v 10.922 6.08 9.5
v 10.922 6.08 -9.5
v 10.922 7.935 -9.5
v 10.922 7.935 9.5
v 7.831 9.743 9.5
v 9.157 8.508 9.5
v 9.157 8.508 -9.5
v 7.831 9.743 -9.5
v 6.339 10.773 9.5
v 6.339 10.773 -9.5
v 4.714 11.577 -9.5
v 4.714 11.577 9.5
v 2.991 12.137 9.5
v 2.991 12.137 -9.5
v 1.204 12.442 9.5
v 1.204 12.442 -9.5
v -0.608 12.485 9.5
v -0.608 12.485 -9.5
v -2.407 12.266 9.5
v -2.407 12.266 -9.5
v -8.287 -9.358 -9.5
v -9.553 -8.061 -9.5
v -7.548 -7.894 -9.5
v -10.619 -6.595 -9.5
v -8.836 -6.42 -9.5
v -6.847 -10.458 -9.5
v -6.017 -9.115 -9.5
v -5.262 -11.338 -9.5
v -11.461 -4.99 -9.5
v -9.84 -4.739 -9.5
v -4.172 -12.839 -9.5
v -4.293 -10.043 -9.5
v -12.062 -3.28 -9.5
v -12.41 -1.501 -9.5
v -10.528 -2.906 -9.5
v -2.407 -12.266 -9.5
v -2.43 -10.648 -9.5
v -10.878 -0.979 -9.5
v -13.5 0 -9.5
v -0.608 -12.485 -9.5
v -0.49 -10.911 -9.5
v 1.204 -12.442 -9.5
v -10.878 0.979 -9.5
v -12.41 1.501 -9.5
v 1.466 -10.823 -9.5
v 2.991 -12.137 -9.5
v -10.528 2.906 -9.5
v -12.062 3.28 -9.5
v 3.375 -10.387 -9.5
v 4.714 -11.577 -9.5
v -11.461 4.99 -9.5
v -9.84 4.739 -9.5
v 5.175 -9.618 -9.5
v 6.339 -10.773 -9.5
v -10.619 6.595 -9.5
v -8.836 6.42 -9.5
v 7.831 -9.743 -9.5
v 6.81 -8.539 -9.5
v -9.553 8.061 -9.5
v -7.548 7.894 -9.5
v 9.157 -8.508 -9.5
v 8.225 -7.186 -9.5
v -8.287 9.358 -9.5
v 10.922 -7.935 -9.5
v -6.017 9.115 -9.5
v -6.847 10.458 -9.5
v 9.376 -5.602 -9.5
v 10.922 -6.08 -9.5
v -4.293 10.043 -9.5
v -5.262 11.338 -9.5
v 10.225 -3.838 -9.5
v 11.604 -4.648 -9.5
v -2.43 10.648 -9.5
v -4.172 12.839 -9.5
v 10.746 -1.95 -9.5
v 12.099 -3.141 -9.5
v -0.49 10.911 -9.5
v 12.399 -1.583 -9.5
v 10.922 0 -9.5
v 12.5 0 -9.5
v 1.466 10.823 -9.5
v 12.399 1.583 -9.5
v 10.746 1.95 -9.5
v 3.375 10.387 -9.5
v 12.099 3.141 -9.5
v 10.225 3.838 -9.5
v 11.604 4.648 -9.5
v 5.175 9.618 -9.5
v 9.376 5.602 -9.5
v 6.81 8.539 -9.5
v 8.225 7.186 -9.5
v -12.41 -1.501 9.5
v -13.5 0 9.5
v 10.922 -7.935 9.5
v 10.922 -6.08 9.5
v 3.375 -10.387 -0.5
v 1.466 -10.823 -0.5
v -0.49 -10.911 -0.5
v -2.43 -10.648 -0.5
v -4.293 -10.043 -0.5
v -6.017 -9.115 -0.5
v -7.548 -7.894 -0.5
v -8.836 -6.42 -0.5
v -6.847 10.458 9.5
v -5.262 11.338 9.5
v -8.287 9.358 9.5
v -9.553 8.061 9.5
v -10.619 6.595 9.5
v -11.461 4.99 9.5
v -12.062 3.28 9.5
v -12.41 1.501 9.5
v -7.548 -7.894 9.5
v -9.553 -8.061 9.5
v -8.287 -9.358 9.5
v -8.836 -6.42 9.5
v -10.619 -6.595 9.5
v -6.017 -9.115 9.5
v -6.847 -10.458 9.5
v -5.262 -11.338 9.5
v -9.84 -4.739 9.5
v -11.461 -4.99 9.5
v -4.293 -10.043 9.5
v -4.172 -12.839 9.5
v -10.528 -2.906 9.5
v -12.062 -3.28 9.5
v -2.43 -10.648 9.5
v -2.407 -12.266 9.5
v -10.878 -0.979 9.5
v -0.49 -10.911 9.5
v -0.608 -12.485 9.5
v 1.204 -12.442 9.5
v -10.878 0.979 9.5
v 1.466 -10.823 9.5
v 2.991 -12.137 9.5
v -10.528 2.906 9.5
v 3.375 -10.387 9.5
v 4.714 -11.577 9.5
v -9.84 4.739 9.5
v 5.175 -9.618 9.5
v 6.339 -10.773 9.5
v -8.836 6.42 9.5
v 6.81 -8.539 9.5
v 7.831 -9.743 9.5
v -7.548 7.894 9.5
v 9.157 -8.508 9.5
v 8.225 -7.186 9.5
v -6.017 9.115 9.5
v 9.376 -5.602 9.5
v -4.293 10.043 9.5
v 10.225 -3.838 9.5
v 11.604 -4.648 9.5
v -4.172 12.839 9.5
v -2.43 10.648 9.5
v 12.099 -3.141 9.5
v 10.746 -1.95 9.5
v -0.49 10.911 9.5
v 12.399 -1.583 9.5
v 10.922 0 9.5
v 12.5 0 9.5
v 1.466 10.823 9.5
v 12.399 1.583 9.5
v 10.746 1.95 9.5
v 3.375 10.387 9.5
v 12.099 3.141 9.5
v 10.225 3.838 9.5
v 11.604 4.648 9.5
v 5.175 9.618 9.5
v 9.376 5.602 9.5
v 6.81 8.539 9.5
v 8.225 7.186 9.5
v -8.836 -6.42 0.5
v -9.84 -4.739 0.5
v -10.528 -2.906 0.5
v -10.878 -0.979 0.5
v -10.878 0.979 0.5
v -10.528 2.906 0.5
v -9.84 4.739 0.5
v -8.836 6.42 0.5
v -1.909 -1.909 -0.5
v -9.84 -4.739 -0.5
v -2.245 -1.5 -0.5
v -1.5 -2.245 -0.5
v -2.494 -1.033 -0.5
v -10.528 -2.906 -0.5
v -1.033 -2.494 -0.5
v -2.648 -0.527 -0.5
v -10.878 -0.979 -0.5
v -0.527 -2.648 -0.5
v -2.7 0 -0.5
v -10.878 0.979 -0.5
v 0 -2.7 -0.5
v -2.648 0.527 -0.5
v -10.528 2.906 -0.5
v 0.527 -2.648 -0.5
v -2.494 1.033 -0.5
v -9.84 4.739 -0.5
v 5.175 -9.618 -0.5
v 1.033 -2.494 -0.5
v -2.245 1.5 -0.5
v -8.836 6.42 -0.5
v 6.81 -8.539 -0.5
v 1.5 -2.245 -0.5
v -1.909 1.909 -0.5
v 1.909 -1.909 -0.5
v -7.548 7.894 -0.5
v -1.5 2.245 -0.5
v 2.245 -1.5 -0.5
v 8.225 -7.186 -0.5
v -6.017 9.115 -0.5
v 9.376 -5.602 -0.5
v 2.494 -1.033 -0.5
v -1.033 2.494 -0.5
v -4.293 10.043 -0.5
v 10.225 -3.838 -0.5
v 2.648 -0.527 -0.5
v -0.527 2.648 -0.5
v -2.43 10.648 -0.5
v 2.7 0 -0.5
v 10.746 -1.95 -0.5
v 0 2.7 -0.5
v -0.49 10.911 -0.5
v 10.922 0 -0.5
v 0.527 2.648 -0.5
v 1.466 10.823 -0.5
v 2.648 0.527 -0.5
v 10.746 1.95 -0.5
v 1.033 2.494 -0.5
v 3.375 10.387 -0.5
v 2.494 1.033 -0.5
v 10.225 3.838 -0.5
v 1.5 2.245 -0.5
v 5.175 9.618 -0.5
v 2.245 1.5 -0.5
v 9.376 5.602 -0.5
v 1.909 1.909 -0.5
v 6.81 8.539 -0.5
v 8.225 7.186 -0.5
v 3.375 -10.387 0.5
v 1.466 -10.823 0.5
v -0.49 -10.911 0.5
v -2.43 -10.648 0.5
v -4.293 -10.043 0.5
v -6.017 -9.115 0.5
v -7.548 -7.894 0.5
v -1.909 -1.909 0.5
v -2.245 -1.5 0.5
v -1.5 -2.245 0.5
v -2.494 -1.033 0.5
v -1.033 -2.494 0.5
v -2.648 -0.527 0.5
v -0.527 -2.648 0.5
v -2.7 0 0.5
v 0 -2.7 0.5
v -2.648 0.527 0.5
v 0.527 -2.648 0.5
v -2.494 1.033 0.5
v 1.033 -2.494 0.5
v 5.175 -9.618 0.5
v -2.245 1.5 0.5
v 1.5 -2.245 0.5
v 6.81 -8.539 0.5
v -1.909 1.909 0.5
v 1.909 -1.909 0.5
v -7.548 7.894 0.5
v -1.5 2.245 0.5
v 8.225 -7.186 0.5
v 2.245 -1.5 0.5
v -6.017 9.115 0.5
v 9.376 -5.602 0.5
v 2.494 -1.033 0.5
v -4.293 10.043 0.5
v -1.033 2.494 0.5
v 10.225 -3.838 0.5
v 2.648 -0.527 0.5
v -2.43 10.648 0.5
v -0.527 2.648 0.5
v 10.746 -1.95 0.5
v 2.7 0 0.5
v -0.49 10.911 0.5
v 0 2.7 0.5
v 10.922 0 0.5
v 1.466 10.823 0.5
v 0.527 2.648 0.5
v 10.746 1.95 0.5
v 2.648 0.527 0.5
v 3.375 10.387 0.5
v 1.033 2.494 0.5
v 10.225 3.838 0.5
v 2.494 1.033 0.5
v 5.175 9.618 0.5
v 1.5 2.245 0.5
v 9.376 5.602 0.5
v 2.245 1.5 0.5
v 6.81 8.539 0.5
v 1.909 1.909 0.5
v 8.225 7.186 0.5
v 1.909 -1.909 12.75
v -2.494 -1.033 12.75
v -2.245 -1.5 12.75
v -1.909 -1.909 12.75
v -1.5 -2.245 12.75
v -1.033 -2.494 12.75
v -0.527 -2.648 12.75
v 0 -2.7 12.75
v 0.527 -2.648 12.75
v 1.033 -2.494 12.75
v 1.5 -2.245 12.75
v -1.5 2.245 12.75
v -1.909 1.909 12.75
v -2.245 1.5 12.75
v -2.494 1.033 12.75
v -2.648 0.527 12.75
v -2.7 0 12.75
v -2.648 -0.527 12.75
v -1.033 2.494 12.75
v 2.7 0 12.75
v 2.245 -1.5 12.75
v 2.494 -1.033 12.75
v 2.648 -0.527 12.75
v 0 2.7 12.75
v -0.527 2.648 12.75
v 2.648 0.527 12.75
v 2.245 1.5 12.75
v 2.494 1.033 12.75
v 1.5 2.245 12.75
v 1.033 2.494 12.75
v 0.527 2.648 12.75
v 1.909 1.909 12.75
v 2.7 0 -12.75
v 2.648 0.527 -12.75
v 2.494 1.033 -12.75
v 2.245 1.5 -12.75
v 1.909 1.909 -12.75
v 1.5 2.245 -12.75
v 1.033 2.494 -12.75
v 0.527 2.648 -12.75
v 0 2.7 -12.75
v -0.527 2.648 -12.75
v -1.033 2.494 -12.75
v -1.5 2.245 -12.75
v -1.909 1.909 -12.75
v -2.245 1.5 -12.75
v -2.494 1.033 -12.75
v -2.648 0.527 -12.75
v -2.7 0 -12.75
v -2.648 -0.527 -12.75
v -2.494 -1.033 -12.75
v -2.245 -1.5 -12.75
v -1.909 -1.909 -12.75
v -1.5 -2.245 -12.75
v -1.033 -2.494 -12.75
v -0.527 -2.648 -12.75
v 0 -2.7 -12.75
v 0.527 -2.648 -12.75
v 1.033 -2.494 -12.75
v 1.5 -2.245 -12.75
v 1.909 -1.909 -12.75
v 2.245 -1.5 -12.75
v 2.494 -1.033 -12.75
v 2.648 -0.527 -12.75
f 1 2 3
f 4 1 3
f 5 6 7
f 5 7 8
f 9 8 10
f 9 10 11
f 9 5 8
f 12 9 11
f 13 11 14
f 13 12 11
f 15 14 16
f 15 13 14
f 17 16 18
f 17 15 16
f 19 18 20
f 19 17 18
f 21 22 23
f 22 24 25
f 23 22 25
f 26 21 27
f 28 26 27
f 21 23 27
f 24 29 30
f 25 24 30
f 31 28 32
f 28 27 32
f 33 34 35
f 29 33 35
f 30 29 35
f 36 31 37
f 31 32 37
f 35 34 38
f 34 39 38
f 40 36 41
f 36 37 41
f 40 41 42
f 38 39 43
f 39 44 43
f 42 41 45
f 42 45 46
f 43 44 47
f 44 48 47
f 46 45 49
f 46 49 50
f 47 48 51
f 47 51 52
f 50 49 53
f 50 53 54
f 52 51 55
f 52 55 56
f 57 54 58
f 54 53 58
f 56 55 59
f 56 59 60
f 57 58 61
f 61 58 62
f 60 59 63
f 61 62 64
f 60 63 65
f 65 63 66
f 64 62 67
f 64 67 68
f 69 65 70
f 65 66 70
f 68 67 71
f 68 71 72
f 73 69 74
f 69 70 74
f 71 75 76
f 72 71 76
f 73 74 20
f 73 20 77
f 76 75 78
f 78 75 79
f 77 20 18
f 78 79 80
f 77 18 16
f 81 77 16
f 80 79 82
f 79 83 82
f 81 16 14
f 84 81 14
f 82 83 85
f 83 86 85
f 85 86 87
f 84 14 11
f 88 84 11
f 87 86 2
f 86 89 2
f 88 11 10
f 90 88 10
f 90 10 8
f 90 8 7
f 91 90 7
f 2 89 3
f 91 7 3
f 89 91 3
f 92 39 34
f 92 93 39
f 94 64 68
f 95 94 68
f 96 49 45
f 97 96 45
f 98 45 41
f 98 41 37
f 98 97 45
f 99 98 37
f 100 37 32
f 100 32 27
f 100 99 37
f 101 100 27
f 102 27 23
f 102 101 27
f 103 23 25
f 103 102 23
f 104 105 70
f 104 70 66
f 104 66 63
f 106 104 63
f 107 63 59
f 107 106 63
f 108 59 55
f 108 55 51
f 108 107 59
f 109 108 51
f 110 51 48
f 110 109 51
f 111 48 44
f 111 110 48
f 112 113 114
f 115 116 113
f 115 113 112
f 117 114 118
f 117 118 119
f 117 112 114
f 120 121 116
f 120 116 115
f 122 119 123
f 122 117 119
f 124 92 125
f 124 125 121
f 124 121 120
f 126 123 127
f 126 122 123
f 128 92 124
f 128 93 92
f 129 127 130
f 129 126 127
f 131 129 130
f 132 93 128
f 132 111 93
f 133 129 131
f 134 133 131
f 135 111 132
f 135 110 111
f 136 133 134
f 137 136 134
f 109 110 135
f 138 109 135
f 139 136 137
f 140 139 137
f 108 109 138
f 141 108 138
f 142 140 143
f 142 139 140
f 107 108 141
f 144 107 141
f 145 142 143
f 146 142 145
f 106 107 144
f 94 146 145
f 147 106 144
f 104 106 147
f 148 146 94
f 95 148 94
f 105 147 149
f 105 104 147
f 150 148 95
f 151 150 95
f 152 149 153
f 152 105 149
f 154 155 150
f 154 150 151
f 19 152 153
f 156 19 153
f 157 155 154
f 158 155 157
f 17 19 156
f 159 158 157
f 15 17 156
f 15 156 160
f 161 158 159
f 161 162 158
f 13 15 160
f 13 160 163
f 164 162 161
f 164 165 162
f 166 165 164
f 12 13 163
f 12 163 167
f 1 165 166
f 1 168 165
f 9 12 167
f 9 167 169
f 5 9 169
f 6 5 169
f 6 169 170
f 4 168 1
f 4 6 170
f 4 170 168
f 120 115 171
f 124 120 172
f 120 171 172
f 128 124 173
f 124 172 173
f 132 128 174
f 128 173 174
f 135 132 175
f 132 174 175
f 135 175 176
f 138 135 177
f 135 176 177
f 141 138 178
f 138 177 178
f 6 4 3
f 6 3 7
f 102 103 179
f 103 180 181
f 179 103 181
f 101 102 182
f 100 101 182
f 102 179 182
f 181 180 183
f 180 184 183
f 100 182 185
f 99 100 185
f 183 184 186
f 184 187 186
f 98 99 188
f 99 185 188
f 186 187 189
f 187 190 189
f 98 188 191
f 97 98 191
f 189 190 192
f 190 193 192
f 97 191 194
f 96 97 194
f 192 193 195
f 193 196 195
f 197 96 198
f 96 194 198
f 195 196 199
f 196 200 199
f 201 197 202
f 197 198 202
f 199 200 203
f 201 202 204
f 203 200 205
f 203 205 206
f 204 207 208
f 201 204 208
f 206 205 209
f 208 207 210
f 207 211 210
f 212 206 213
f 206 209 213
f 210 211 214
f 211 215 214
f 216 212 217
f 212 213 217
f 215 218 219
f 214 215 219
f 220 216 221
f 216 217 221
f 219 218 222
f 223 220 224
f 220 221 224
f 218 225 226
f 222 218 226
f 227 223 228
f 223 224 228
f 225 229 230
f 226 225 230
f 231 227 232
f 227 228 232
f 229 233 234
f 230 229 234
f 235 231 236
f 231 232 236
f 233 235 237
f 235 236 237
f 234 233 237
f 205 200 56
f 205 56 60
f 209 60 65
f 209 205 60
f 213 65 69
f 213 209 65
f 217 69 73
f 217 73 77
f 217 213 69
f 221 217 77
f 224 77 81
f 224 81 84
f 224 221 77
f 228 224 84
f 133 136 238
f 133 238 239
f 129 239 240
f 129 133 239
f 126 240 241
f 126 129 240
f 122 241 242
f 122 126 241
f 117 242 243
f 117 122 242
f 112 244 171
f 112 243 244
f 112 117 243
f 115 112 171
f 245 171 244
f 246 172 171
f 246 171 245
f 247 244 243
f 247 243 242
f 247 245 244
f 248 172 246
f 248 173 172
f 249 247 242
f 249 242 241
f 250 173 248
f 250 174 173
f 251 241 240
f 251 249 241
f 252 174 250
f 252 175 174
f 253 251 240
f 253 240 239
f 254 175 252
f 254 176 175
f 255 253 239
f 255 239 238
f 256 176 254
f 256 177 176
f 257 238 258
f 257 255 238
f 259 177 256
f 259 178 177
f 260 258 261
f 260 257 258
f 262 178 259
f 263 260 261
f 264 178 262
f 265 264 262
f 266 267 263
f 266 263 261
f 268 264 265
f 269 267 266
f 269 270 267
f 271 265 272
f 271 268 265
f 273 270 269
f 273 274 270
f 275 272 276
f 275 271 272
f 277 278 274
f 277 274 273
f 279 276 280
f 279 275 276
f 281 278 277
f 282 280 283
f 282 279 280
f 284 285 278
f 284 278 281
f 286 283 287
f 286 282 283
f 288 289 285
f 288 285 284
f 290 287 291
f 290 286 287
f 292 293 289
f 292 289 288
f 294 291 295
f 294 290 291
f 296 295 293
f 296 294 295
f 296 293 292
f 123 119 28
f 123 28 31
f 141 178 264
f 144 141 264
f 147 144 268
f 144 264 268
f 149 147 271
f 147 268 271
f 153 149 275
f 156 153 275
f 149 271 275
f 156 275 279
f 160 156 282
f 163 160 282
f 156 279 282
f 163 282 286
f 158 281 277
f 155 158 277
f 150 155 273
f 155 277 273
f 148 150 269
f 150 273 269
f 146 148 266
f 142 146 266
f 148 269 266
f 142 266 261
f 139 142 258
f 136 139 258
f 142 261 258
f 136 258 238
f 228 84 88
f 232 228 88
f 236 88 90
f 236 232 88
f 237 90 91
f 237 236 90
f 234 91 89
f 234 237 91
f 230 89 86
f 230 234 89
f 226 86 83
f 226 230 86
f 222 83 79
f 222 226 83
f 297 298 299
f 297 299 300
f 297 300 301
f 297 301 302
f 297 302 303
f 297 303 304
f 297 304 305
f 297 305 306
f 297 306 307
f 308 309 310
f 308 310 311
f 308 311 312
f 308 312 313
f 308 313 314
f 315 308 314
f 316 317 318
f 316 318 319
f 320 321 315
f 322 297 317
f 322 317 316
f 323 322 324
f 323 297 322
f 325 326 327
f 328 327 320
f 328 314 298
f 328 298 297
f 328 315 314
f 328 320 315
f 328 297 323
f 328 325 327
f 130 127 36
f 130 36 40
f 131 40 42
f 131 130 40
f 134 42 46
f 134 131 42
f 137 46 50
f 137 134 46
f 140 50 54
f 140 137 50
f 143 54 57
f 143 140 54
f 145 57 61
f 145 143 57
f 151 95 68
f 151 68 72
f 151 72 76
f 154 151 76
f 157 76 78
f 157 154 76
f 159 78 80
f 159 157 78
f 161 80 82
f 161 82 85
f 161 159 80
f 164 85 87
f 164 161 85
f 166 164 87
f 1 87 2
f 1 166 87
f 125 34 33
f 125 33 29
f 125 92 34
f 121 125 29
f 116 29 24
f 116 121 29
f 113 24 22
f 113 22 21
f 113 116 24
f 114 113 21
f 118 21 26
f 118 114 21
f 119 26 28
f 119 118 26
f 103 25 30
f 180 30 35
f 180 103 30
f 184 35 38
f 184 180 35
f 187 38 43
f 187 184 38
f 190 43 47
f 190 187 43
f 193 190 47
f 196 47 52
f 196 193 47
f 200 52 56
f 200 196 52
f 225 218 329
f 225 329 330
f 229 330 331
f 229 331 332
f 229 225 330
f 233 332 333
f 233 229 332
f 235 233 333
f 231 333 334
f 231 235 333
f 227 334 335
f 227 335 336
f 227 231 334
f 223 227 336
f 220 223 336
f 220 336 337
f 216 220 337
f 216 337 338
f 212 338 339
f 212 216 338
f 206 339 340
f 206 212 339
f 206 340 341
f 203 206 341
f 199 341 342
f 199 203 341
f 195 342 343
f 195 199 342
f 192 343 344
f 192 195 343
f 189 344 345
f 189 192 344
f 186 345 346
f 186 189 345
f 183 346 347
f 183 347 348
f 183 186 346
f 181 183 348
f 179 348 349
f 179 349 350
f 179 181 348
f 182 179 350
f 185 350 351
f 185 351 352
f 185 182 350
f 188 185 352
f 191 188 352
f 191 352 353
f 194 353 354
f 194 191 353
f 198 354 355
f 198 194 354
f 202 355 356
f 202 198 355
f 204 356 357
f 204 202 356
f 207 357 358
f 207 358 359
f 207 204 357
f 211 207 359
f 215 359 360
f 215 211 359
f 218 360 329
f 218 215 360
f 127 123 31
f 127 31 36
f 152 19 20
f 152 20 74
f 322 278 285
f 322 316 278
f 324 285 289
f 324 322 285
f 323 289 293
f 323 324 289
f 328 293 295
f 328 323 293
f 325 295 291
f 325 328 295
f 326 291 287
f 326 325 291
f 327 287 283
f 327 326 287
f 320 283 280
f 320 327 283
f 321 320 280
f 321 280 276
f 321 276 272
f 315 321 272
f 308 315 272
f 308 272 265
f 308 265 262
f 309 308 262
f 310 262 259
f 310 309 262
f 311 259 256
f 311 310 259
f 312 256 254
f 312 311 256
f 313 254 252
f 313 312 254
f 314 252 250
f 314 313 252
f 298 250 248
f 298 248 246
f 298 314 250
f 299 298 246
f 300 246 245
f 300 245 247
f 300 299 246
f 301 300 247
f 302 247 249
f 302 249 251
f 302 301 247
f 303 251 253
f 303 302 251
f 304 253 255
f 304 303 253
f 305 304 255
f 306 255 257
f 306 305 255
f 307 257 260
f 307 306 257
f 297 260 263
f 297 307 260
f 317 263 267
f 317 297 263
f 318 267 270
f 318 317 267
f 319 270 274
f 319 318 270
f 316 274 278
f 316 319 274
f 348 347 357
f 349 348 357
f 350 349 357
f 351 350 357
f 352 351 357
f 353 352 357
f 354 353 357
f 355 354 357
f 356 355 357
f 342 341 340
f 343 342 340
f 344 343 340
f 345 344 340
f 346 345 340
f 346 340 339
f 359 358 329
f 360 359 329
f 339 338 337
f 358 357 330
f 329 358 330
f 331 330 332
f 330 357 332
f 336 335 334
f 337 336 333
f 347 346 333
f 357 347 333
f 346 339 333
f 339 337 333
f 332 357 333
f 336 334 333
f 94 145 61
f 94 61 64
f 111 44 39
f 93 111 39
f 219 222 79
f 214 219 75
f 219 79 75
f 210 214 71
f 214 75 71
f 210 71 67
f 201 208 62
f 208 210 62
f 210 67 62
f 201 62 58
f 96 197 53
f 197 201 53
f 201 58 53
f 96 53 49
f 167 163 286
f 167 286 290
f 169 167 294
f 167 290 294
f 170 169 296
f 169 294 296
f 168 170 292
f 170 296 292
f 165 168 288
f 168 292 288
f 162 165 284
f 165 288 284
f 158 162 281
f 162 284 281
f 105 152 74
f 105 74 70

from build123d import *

# Parameters (mm, degrees)
F1_DEPTH = 9.5
F0_R     = 2.7
F2_DEPTH = 12.75
F3_DEPTH = 0.5


with BuildPart() as f1:
    # F0 (on Top) → F1 (new body, symmetric)
    with BuildSketch(Plane.XY):
        with BuildLine():
            Line((10.9217294241, 6.0799529679), (10.9217294241, 7.9351009059))
            Line((10.9217294241, 7.9351009059), (9.1573788889, 8.5083731459))
            ThreePointArc((9.1573788889, 8.5083731459), (10.1127124848, 7.3473156937), (10.9217294241, 6.0799529679))
        make_face()
        with BuildLine():
            ThreePointArc((12.5000000682, 0), (12.0990003771, 3.1407310581), (10.9217294241, 6.0799529679))
            Line((10.9217294241, 6.0799529679), (10.9217294241, 0))
            Line((10.9217294241, 0), (10.9217294241, -6.0799529679))
            ThreePointArc((10.9217294241, -6.0799529679), (12.0990003771, -3.1407310581), (12.5000000682, 0))
        make_face()
        with BuildLine():
            Line((10.9217294241, 0), (10.9217294241, 6.0799529679))
            ThreePointArc((10.9217294241, 6.0799529679), (10.1127124848, 7.3473156937), (9.1573788889, 8.5083731459))
            Line((9.1573788889, 8.5083731459), (3.3749999593, 10.3871819512))
            ThreePointArc((3.3749999593, 10.3871819512), (8.8358646995, 6.4196315023), (10.9217294241, 0))
        make_face()
        with BuildLine():
            Line((3.3749999593, 10.3871819512), (9.1573788889, 8.5083731459))
            ThreePointArc((9.1573788889, 8.5083731459), (3.8627124507, 11.8882065185), (-2.4073788889, 12.26599073))
            Line((-2.4073788889, 12.26599073), (3.3749999593, 10.3871819512))
        make_face()
        with BuildLine():
            Line((10.9217294241, -6.0799529679), (10.9217294241, 0))
            ThreePointArc((10.9217294241, 0), (8.8358646995, -6.4196315023), (3.3749999593, -10.3871819512))
            Line((3.3749999593, -10.3871819512), (9.1573788889, -8.5083731459))
            ThreePointArc((9.1573788889, -8.5083731459), (10.1127124848, -7.3473156937), (10.9217294241, -6.0799529679))
        make_face()
        with BuildLine():
            ThreePointArc((-8.8358646984, 6.4196315037), (-3.3750000093, 10.3871819349), (3.3749999593, 10.3871819512))
            Line((3.3749999593, 10.3871819512), (-2.4073788889, 12.26599073))
            ThreePointArc((-2.4073788889, 12.26599073), (-3.8627124507, 11.8882065185), (-5.2621580229, 11.338416761))
            Line((-5.2621580229, 11.338416761), (-8.8358646984, 6.4196315037))
        make_face()
        with BuildLine():
            ThreePointArc((-5.2621580229, 11.338416761), (-3.8627124507, 11.8882065185), (-2.4073788889, 12.26599073))
            Line((-2.4073788889, 12.26599073), (-4.1717294241, 12.83926297))
            Line((-4.1717294241, 12.83926297), (-5.2621580229, 11.338416761))
        make_face()
        with BuildLine():
            Line((10.9217294241, -7.9351009059), (10.9217294241, -6.0799529679))
            ThreePointArc((10.9217294241, -6.0799529679), (10.1127124848, -7.3473156937), (9.1573788889, -8.5083731459))
            Line((9.1573788889, -8.5083731459), (10.9217294241, -7.9351009059))
        make_face()
        with BuildLine():
            Line((9.1573788889, -8.5083731459), (3.3749999593, -10.3871819512))
            Line((3.3749999593, -10.3871819512), (-2.4073788889, -12.26599073))
            ThreePointArc((-2.4073788889, -12.26599073), (3.8627124507, -11.8882065185), (9.1573788889, -8.5083731459))
        make_face()
        with BuildLine():
            Line((-2.4073788889, -12.26599073), (3.3749999593, -10.3871819512))
            ThreePointArc((3.3749999593, -10.3871819512), (-3.3749999125, -10.3871819664), (-8.8358645787, -6.4196316685))
            Line((-8.8358645787, -6.4196316685), (-5.2621580229, -11.338416761))
            ThreePointArc((-5.2621580229, -11.338416761), (-3.8627124507, -11.8882065185), (-2.4073788889, -12.26599073))
        make_face()
        with BuildLine():
            ThreePointArc((-8.8358645787, -6.4196316685), (-10.9217294241, -1.018e-07), (-8.8358646984, 6.4196315037))
            Line((-8.8358646984, 6.4196315037), (-12.4095714012, 1.500846209))
            ThreePointArc((-12.4095714012, 1.500846209), (-12.5000000682, 0), (-12.4095714012, -1.500846209))
            Line((-12.4095714012, -1.500846209), (-8.8358645787, -6.4196316685))
        make_face()
        with BuildLine():
            Line((-12.4095714012, 1.500846209), (-8.8358646984, 6.4196315037))
            Line((-8.8358646984, 6.4196315037), (-5.2621580229, 11.338416761))
            ThreePointArc((-5.2621580229, 11.338416761), (-10.1127124848, 7.3473156937), (-12.4095714012, 1.500846209))
        make_face()
        with BuildLine():
            Line((-4.1717294241, -12.83926297), (-2.4073788889, -12.26599073))
            ThreePointArc((-2.4073788889, -12.26599073), (-3.8627124507, -11.8882065185), (-5.2621580229, -11.338416761))
            Line((-5.2621580229, -11.338416761), (-4.1717294241, -12.83926297))
        make_face()
        with BuildLine():
            Line((-5.2621580229, -11.338416761), (-8.8358645787, -6.4196316685))
            Line((-8.8358645787, -6.4196316685), (-12.4095714012, -1.500846209))
            ThreePointArc((-12.4095714012, -1.500846209), (-10.1127124848, -7.3473156937), (-5.2621580229, -11.338416761))
        make_face()
        with BuildLine():
            ThreePointArc((-12.4095714012, -1.500846209), (-12.5000000682, 0), (-12.4095714012, 1.500846209))
            Line((-12.4095714012, 1.500846209), (-13.5, 0))
            Line((-13.5, 0), (-12.4095714012, -1.500846209))
        make_face()
    extrude(amount=F1_DEPTH, both=True)



with BuildPart() as f1b:
    # F0 (on Top) → F1, piece 2 (new body, symmetric)
    with BuildSketch(Plane.XY):
        Circle(F0_R)
    extrude(amount=F1_DEPTH, both=True)

    # F0 (on Top) → F2 (join, symmetric)
    with BuildSketch(Plane.XY):
        Circle(F0_R)
    extrude(amount=F2_DEPTH, both=True)


with BuildPart() as f1_1:
    add(f1.part)

    add(f1b.part)  # F3 merges F1b
    # F0 (on Top) → F3 (join, symmetric)
    with BuildSketch(Plane.XY):
        with BuildLine():
            ThreePointArc((3.3749999593, -10.3871819512), (8.8358646995, -6.4196315023), (10.9217294241, 0))
            ThreePointArc((10.9217294241, 0), (8.8358646995, 6.4196315023), (3.3749999593, 10.3871819512))
            ThreePointArc((3.3749999593, 10.3871819512), (-3.3750000093, 10.3871819349), (-8.8358646984, 6.4196315037))
            ThreePointArc((-8.8358646984, 6.4196315037), (-10.9217294241, -1.018e-07), (-8.8358645787, -6.4196316685))
            ThreePointArc((-8.8358645787, -6.4196316685), (-3.3749999125, -10.3871819664), (3.3749999593, -10.3871819512))
        make_face()
        Circle(F0_R, mode=Mode.SUBTRACT)
    extrude(amount=F3_DEPTH, both=True)


solid = f1_1.part
